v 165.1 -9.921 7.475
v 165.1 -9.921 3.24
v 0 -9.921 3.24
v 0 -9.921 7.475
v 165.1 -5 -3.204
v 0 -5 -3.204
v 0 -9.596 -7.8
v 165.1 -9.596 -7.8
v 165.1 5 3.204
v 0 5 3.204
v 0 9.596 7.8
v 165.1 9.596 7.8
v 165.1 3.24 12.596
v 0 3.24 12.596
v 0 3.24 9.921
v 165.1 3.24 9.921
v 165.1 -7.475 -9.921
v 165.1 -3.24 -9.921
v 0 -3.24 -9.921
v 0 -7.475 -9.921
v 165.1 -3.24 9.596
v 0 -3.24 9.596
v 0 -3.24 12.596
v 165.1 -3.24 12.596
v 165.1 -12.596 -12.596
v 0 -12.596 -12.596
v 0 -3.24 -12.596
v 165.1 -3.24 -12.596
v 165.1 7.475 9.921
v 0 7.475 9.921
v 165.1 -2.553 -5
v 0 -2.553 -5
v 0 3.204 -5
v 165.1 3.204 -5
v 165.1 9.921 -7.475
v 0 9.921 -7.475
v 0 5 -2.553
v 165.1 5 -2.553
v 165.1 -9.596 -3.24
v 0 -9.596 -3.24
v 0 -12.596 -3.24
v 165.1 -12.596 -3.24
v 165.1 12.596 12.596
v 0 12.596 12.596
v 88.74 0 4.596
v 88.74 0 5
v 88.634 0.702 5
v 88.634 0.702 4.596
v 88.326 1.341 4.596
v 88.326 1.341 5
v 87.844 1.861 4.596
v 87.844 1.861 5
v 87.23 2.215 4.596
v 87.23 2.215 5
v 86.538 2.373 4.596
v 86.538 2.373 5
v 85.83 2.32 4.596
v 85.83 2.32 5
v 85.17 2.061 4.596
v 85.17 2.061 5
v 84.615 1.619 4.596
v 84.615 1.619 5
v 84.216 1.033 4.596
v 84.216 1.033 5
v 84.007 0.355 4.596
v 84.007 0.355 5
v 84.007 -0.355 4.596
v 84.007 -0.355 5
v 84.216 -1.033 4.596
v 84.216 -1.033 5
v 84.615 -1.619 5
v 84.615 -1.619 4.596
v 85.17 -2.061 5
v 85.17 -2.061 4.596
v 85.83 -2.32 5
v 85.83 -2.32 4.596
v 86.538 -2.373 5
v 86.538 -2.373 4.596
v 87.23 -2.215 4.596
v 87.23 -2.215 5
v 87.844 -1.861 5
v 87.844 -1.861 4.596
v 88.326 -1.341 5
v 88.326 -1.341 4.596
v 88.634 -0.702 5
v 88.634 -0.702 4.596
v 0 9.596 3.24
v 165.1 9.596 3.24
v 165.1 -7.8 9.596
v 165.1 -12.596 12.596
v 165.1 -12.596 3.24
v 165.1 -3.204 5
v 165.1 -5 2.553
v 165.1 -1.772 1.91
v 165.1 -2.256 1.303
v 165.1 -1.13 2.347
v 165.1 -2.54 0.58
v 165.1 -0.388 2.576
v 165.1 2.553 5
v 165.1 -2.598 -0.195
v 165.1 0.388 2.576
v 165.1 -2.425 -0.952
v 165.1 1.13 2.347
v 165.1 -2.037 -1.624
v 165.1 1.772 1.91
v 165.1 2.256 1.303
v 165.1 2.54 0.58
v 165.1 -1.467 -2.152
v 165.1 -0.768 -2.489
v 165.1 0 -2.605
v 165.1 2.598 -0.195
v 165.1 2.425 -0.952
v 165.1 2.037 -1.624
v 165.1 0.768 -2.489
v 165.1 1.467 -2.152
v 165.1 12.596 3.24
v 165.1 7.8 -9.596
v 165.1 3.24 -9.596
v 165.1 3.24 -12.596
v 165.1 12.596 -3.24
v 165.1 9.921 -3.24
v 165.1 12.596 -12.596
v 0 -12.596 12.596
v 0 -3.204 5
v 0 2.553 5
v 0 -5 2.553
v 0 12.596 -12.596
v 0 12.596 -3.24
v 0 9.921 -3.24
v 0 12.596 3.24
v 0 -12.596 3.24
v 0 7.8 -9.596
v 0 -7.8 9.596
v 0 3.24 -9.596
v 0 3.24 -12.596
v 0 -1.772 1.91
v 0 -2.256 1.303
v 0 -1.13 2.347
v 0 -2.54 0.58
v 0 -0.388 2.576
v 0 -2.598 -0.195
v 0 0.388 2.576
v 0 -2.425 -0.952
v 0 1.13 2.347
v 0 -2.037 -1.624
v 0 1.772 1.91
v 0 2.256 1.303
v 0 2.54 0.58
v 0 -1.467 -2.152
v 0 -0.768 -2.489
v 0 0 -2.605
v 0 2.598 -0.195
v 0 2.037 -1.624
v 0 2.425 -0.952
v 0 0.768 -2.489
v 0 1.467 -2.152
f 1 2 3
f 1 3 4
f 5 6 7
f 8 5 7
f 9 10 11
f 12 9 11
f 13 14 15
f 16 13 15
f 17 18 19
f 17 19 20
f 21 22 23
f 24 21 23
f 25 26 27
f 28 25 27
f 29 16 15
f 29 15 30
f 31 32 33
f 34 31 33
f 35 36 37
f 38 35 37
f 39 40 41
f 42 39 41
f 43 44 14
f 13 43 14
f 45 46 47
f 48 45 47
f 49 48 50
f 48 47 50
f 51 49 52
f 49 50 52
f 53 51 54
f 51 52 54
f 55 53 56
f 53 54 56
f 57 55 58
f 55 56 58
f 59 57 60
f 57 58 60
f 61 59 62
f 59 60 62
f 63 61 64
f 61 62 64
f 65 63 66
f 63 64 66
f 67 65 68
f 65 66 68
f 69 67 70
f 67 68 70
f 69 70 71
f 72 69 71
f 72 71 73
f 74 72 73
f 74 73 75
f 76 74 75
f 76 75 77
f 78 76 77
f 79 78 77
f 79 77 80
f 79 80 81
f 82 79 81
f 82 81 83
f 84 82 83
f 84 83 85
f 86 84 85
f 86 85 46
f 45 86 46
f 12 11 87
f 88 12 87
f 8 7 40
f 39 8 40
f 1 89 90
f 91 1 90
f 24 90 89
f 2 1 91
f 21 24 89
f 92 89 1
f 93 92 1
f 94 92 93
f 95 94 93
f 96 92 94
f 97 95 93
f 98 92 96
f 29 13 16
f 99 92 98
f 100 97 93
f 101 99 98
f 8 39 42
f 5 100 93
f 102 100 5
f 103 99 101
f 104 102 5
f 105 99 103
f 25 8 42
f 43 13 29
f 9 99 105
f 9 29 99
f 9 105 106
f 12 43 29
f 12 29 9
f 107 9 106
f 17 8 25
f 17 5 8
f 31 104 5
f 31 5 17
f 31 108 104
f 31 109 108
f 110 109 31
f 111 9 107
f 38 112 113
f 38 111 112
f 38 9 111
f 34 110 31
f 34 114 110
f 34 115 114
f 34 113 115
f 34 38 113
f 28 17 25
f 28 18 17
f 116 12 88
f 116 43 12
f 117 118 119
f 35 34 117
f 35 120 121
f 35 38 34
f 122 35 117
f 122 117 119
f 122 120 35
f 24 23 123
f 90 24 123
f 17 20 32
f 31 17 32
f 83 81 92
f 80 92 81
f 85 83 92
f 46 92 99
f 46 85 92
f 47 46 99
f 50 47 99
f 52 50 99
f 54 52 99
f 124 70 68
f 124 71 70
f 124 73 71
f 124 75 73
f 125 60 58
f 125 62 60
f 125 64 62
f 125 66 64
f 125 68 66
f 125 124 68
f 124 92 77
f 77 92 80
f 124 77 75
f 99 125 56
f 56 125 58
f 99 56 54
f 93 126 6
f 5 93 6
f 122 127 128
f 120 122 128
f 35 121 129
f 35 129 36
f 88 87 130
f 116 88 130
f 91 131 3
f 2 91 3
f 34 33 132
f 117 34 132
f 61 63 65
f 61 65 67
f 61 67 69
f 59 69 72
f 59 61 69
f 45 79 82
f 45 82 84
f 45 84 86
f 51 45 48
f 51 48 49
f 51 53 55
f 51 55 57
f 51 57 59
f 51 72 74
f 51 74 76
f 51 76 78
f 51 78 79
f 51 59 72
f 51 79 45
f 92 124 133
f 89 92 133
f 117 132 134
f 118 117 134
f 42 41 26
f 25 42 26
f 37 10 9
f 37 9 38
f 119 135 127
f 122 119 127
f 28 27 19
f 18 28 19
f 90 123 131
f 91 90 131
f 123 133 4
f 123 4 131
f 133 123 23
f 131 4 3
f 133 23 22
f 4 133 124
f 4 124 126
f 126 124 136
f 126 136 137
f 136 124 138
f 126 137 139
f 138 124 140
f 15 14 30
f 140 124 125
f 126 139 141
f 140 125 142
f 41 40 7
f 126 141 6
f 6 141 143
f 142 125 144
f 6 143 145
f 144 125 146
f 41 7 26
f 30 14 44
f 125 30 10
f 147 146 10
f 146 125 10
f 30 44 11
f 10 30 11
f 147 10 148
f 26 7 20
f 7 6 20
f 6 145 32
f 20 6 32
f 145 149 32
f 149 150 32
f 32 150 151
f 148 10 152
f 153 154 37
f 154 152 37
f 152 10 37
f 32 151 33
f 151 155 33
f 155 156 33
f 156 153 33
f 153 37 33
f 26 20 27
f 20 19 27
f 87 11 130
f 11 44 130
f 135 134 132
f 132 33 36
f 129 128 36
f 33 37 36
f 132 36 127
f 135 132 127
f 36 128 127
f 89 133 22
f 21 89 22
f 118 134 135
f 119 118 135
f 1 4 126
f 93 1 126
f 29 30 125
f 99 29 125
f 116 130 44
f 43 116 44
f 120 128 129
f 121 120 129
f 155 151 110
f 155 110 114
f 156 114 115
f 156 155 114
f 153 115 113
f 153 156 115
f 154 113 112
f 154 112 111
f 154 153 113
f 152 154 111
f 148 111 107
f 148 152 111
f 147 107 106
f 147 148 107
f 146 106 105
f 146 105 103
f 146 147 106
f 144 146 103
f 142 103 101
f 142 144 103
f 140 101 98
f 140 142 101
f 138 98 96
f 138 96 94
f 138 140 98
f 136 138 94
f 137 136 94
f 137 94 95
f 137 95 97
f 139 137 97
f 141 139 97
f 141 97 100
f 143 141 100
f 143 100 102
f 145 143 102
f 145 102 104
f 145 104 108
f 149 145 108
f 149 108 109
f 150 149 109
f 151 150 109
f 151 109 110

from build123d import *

# Parameters (mm, degrees)
SKETCH1_R           = 2.605
BOSS_EXTRUDE1_DEPTH = 165.1
CIRPATTERN1_COUNT   = 4
SKETCH2_R           = 2.38
CUT_EXTRUDE6_DEPTH  = 8


with BuildPart() as part:
    # Sketch1 → Boss-Extrude1 (new body)
    with BuildSketch(Plane(origin=(0, 0, 0), x_dir=(0, 0, -1), z_dir=(1, 0, 0))):
        Polygon((5, -5), (5, 3.203948776), (9.596194078, 7.800142853), (9.596194078, 3.24), (12.596194078, 3.24), (12.596194078, 12.596194078), (3.24, 12.596194078), (3.24, 9.921463197), (7.474873734, 9.921463197), (2.553410537, 5), (-5, 5), (-5, -5), align=None)
        Circle(SKETCH1_R, mode=Mode.SUBTRACT)
    boss_extrude1 = extrude(amount=BOSS_EXTRUDE1_DEPTH)

    # CirPattern1: Boss-Extrude1 ×4 about axis
    cirpattern1_axis = Axis((0, 0, 0), (1, 0, 0))
    for i in range(1, CIRPATTERN1_COUNT):
        add(boss_extrude1.rotate(cirpattern1_axis, i * 360 / CIRPATTERN1_COUNT))

    # Sketch2 → Cut-Extrude6 (cut)
    with BuildSketch(Plane.XY.offset(12.596194078)):
        with Locations((86.36, 0)):
            Circle(SKETCH2_R)
    extrude(amount=-CUT_EXTRUDE6_DEPTH, mode=Mode.SUBTRACT)


solid = part.part
